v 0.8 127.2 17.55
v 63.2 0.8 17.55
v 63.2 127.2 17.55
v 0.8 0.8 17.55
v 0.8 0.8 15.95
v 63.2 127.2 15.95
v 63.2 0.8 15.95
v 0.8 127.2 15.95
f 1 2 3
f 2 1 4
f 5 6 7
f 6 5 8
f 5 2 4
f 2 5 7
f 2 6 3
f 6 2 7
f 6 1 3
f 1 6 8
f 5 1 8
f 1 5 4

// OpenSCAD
// file: variants-pipe.scad
include <variants-reed-pipe.scad>

variants_pipe_len = 200;
variants_pipe_in_d = 8;
variants_pipe_thickness_top = 4;
variants_pipe_thickness_bottom = 10;
//variants_pipe_thickness_top = 6;
//variants_pipe_thickness_bottom = 6;
variants_pipe_bottom_d = variants_pipe_in_d + 2 * variants_pipe_thickness_bottom;
variants_pipe_plug_in_d = 18;
variants_pipe_plug_out_d = 20;
variants_pipe_plug_stopper_d = 30;
reed_socket_len = variants_reed_pipe_end_length;
pipe_plug_len=25;
horn_plug_len=13;
horn_plug_in_d = 13.5;
horn_plug_out_d = 20;
horn_pos = -horn_plug_len;

//9
variants_pipe_holes=[
                        // 9b
                         [0.1075, 7/variants_reed_pipe_in_diameter], // d
                        // 9 a
                        //[0.105, 7/variants_reed_pipe_in_diameter], // d
                        [0.233, 8/variants_reed_pipe_in_diameter],  // e
                        [0.365, 6/variants_reed_pipe_in_diameter],  // f
                        [0.43, 6/variants_reed_pipe_in_diameter],  // f#
                        [0.5, 7/variants_reed_pipe_in_diameter], // g
                        [0.68, 7/variants_reed_pipe_in_diameter],  // a
                        [/*0.725*/0.77, 6/variants_reed_pipe_in_diameter], // b / h
                        [0.865, 6/variants_reed_pipe_in_diameter], // c
                        [0.94, 6/variants_reed_pipe_in_diameter],  // d
];

// 8          
//variants_pipe_holes=[
//                        // 8b
//                         [0.1075, 7/variants_reed_pipe_in_diameter], // d
//                        // 8 a
//                        //[0.105, 7/variants_reed_pipe_in_diameter], // d
//                        [0.233, 8/variants_reed_pipe_in_diameter],  // e
//                        [0.365, 6/variants_reed_pipe_in_diameter],  // f
//                        [0.43, 6/variants_reed_pipe_in_diameter],  // f#
//                        [0.5, 7/variants_reed_pipe_in_diameter], // g
//                        [0.68, 7/variants_reed_pipe_in_diameter],  // a
//                        [/*0.725*/0.78, 6/variants_reed_pipe_in_diameter], // b / h
//                        [0.89, 5/variants_reed_pipe_in_diameter], // c
//                        [0.94, 6/variants_reed_pipe_in_diameter],  // d
//]
// 7 majorowa, odrobinę za niskie d
//variants_pipe_holes=[
//                         [0.10, 7/variants_reed_pipe_in_diameter], // d
//                        [0.233, 8/variants_reed_pipe_in_diameter],  // e
//                        [0.365, 6/variants_reed_pipe_in_diameter],  // f
//                        [0.43, 6/variants_reed_pipe_in_diameter],  // f#
//                        [0.5, 7/variants_reed_pipe_in_diameter], // g
//                        [0.68, 7/variants_reed_pipe_in_diameter],  // a
//                        [/*0.725*/0.78, 6/variants_reed_pipe_in_diameter], // b / h
//                        [0.89, 5/variants_reed_pipe_in_diameter], // c
//                        [0.94, 6/variants_reed_pipe_in_diameter],  // d
//                    ];
// 6
//variants_pipe_holes=[
//                         [0.095, 7/variants_reed_pipe_in_diameter], // d
//                        [0.23, 8/variants_reed_pipe_in_diameter],  // e
//                        [0.36, 6/variants_reed_pipe_in_diameter],  // f
//                        [0.43, 6/variants_reed_pipe_in_diameter],  // f#
//                        [0.5, 7/variants_reed_pipe_in_diameter], // g
//                        [0.68, 7/variants_reed_pipe_in_diameter],  // a
//                        [/*0.725*/0.78, 6/variants_reed_pipe_in_diameter], // b / h
//                        [0.89, 5/variants_reed_pipe_in_diameter], // c
//                        [0.94, 6/variants_reed_pipe_in_diameter],  // d
//                    ];
                    
// 5
//variants_pipe_holes=[
//                         [0.095, 8/variants_reed_pipe_in_diameter], // d
//                        [0.23, 8/variants_reed_pipe_in_diameter],  // e
//                        [0.36, 6/variants_reed_pipe_in_diameter],  // f
//                        [0.4, 6/variants_reed_pipe_in_diameter],  // f#
//                        [0.5, 7/variants_reed_pipe_in_diameter], // g
//                        [0.68, 7/variants_reed_pipe_in_diameter],  // a
//                        [/*0.725*/0.78, 6/variants_reed_pipe_in_diameter], // b / h
//                        [0.89, 6/variants_reed_pipe_in_diameter], // c
//                        [0.94, 6/variants_reed_pipe_in_diameter],  // d
//                    ];
// 4  
//variants_pipe_holes=[
//                         [0.095, 7/variants_reed_pipe_in_diameter], // d
//                        [0.23, 8/variants_reed_pipe_in_diameter],  // e
//                        [0.36, 6/variants_reed_pipe_in_diameter],  // f
//                        [0.4, 6/variants_reed_pipe_in_diameter],  // f#
//                        [0.5, 7/variants_reed_pipe_in_diameter], // g
//                        [0.68, 7/variants_reed_pipe_in_diameter],  // a
//                        [/*0.725*/0.8, 6/variants_reed_pipe_in_diameter], // b / h
//                        [0.9, 5/variants_reed_pipe_in_diameter], // c
//                        [0.95, 5/variants_reed_pipe_in_diameter],  // d
//                    ];

variants_breath_pipe_len = 60;
// file: variants-reed-pipe.scad
// // potentially for "A" pipe!
// variants_reed_pipe_length = 60;
// variants_reed_pipe_in_diameter = 6.5;

// // Alpha state - this plays!
// variants_reed_pipe_length = 45;
// variants_reed_pipe_end_length = 12.5; // -> old value: 0.25 * variants_reed_pipe_length
// echo(str("variants_reed_pipe_end_length: ", variants_reed_pipe_end_length));
// variants_reed_pipe_in_diameter = 6.5;
// variants_reed_pipe_cut_prcnt = 11; // 11 -> plays good, 12 -> a bit hard
// variants_reed_pipe_leaf_degree = 1.65;
// variants_pipe_leaf_stem_heigth_coeff_init = 0.025;
// variants_pipe_leaf_stem_heigth_coeff = 0.010;


variants_reed_pipe_length = 45;
variants_reed_pipe_fastener_length = variants_reed_pipe_length / 10;
variants_reed_pipe_end_length = 12.5; // -> old value: 0.25 * variants_reed_pipe_length
echo(str("variants_reed_pipe_end_length: ", variants_reed_pipe_end_length));
variants_reed_pipe_in_diameter = 7;
variants_reed_pipe_wall_thickness = 0.8;
variants_reed_pipe_cut_prcnt = 11;
variants_reed_pipe_leaf_degree = 1.675;
variants_pipe_leaf_stem_heigth_coeff_init = 0.025;
variants_pipe_leaf_stem_heigth_coeff = 0.010;
// file: reed/rings_tubes_etc.scad
module leaf_fastener_tube(h, d_in, thickness) {
	eps = 0.01;
	difference() {
		cylinder(h = h, d = d_in + 2 * thickness);
		translate([0,0,-eps / 2 ]) cylinder(h = h + eps, d = d_in);
	}
}

eps = 0.1;
flex_hole_narrowing_extra_d_for_rant = 4;
flex_hole_narrowing_clearance = 0.8;

module flex_hole_narrowing() {
	eps = 0.1;
	PLA_shrinking_remedy = 1.225;

	function calculate_h_rel(x = 0) = variants_pipe_thickness_bottom * (variants_pipe_len - x)/variants_pipe_len + x/variants_pipe_len * variants_pipe_thickness_top;

	// holes_no = len(variants_pipe_holes) - 1
	holes_no = [6,7,8];
	hole_sizes = [4,5,6,7];
	// hole_sizes = [6];

	for(i = holes_no) {
		for(j = hole_sizes) {
			echo(i, j);
			translate([j * (variants_pipe_in_d + flex_hole_narrowing_extra_d_for_rant + flex_hole_narrowing_clearance), i * (variants_pipe_in_d + flex_hole_narrowing_extra_d_for_rant + flex_hole_narrowing_clearance), 0]) {
				difference() {
					union() {
						cylinder(h=calculate_h_rel(variants_pipe_holes[i][0] * variants_pipe_len), d=variants_pipe_in_d + PLA_shrinking_remedy);
						cylinder(h=0.8, d=variants_pipe_in_d+flex_hole_narrowing_extra_d_for_rant);
					}
					translate([0,0,-eps/2]) cylinder(h=variants_pipe_in_d * 2, d = j);
				}
			}
		}
	}
}

module box_for_flex_hole_narrowing() {
	unit = (variants_pipe_in_d + flex_hole_narrowing_extra_d_for_rant + flex_hole_narrowing_clearance);
	holes_no = len(variants_pipe_holes);
	hole_sizes = [4,5,6,7];
	b_len = (holes_no + 1) * unit;
	b_wdth = 5 * unit;
	b_h = variants_pipe_in_d;
	// echo(b_len, b_wdth, b_h);
	echo(holes_no, hole_sizes);
	difference() {
		cube([b_wdth, b_len, b_h]);
		translate([unit, unit, variants_pipe_in_d * 0.5 ]) union() {
			for(i = [6, 7, 8]) {
				for(j = [0 : len(hole_sizes) - 1]) {
					translate([j * (variants_pipe_in_d + flex_hole_narrowing_extra_d_for_rant + flex_hole_narrowing_clearance), i * (variants_pipe_in_d + flex_hole_narrowing_extra_d_for_rant + flex_hole_narrowing_clearance), 0]) {
						cylinder(h = variants_pipe_in_d, d = variants_pipe_in_d + flex_hole_narrowing_extra_d_for_rant);
					}
				}
			}
		}
	}
	translate([0, 0, variants_pipe_in_d - eps/2]) {
		cube([1.6, b_len, variants_pipe_in_d + 3.2]);
		cube([b_wdth, 1.6, variants_pipe_in_d + 3.2]);
	}
	translate([b_wdth - 1.6, 0, variants_pipe_in_d - eps/2]) {
		cube([1.6, b_len, variants_pipe_in_d]);
	}
	translate([0, b_len - 1.6, variants_pipe_in_d - eps/2]) {
		cube([b_wdth, 1.6, variants_pipe_in_d + 3.2]);
	}
	!translate([0.8, 0.8, 2 * variants_pipe_in_d - eps/2]) {
		cube([b_wdth - 1.6, b_len - 1.6, 1.6]);
	}
}
// main file
include <reed/rings_tubes_etc.scad>
include <variants-reed-pipe.scad>
include <variants-pipe.scad>

$fn = 100;

// leaf_fastener_tube( variants_reed_pipe_fastener_length,
// 	(variants_reed_pipe_in_diameter + 2 * variants_reed_pipe_wall_thickness) * 0.9, // 0.9 to provide some force.
// 	0.8
// );

box_for_flex_hole_narrowing();
